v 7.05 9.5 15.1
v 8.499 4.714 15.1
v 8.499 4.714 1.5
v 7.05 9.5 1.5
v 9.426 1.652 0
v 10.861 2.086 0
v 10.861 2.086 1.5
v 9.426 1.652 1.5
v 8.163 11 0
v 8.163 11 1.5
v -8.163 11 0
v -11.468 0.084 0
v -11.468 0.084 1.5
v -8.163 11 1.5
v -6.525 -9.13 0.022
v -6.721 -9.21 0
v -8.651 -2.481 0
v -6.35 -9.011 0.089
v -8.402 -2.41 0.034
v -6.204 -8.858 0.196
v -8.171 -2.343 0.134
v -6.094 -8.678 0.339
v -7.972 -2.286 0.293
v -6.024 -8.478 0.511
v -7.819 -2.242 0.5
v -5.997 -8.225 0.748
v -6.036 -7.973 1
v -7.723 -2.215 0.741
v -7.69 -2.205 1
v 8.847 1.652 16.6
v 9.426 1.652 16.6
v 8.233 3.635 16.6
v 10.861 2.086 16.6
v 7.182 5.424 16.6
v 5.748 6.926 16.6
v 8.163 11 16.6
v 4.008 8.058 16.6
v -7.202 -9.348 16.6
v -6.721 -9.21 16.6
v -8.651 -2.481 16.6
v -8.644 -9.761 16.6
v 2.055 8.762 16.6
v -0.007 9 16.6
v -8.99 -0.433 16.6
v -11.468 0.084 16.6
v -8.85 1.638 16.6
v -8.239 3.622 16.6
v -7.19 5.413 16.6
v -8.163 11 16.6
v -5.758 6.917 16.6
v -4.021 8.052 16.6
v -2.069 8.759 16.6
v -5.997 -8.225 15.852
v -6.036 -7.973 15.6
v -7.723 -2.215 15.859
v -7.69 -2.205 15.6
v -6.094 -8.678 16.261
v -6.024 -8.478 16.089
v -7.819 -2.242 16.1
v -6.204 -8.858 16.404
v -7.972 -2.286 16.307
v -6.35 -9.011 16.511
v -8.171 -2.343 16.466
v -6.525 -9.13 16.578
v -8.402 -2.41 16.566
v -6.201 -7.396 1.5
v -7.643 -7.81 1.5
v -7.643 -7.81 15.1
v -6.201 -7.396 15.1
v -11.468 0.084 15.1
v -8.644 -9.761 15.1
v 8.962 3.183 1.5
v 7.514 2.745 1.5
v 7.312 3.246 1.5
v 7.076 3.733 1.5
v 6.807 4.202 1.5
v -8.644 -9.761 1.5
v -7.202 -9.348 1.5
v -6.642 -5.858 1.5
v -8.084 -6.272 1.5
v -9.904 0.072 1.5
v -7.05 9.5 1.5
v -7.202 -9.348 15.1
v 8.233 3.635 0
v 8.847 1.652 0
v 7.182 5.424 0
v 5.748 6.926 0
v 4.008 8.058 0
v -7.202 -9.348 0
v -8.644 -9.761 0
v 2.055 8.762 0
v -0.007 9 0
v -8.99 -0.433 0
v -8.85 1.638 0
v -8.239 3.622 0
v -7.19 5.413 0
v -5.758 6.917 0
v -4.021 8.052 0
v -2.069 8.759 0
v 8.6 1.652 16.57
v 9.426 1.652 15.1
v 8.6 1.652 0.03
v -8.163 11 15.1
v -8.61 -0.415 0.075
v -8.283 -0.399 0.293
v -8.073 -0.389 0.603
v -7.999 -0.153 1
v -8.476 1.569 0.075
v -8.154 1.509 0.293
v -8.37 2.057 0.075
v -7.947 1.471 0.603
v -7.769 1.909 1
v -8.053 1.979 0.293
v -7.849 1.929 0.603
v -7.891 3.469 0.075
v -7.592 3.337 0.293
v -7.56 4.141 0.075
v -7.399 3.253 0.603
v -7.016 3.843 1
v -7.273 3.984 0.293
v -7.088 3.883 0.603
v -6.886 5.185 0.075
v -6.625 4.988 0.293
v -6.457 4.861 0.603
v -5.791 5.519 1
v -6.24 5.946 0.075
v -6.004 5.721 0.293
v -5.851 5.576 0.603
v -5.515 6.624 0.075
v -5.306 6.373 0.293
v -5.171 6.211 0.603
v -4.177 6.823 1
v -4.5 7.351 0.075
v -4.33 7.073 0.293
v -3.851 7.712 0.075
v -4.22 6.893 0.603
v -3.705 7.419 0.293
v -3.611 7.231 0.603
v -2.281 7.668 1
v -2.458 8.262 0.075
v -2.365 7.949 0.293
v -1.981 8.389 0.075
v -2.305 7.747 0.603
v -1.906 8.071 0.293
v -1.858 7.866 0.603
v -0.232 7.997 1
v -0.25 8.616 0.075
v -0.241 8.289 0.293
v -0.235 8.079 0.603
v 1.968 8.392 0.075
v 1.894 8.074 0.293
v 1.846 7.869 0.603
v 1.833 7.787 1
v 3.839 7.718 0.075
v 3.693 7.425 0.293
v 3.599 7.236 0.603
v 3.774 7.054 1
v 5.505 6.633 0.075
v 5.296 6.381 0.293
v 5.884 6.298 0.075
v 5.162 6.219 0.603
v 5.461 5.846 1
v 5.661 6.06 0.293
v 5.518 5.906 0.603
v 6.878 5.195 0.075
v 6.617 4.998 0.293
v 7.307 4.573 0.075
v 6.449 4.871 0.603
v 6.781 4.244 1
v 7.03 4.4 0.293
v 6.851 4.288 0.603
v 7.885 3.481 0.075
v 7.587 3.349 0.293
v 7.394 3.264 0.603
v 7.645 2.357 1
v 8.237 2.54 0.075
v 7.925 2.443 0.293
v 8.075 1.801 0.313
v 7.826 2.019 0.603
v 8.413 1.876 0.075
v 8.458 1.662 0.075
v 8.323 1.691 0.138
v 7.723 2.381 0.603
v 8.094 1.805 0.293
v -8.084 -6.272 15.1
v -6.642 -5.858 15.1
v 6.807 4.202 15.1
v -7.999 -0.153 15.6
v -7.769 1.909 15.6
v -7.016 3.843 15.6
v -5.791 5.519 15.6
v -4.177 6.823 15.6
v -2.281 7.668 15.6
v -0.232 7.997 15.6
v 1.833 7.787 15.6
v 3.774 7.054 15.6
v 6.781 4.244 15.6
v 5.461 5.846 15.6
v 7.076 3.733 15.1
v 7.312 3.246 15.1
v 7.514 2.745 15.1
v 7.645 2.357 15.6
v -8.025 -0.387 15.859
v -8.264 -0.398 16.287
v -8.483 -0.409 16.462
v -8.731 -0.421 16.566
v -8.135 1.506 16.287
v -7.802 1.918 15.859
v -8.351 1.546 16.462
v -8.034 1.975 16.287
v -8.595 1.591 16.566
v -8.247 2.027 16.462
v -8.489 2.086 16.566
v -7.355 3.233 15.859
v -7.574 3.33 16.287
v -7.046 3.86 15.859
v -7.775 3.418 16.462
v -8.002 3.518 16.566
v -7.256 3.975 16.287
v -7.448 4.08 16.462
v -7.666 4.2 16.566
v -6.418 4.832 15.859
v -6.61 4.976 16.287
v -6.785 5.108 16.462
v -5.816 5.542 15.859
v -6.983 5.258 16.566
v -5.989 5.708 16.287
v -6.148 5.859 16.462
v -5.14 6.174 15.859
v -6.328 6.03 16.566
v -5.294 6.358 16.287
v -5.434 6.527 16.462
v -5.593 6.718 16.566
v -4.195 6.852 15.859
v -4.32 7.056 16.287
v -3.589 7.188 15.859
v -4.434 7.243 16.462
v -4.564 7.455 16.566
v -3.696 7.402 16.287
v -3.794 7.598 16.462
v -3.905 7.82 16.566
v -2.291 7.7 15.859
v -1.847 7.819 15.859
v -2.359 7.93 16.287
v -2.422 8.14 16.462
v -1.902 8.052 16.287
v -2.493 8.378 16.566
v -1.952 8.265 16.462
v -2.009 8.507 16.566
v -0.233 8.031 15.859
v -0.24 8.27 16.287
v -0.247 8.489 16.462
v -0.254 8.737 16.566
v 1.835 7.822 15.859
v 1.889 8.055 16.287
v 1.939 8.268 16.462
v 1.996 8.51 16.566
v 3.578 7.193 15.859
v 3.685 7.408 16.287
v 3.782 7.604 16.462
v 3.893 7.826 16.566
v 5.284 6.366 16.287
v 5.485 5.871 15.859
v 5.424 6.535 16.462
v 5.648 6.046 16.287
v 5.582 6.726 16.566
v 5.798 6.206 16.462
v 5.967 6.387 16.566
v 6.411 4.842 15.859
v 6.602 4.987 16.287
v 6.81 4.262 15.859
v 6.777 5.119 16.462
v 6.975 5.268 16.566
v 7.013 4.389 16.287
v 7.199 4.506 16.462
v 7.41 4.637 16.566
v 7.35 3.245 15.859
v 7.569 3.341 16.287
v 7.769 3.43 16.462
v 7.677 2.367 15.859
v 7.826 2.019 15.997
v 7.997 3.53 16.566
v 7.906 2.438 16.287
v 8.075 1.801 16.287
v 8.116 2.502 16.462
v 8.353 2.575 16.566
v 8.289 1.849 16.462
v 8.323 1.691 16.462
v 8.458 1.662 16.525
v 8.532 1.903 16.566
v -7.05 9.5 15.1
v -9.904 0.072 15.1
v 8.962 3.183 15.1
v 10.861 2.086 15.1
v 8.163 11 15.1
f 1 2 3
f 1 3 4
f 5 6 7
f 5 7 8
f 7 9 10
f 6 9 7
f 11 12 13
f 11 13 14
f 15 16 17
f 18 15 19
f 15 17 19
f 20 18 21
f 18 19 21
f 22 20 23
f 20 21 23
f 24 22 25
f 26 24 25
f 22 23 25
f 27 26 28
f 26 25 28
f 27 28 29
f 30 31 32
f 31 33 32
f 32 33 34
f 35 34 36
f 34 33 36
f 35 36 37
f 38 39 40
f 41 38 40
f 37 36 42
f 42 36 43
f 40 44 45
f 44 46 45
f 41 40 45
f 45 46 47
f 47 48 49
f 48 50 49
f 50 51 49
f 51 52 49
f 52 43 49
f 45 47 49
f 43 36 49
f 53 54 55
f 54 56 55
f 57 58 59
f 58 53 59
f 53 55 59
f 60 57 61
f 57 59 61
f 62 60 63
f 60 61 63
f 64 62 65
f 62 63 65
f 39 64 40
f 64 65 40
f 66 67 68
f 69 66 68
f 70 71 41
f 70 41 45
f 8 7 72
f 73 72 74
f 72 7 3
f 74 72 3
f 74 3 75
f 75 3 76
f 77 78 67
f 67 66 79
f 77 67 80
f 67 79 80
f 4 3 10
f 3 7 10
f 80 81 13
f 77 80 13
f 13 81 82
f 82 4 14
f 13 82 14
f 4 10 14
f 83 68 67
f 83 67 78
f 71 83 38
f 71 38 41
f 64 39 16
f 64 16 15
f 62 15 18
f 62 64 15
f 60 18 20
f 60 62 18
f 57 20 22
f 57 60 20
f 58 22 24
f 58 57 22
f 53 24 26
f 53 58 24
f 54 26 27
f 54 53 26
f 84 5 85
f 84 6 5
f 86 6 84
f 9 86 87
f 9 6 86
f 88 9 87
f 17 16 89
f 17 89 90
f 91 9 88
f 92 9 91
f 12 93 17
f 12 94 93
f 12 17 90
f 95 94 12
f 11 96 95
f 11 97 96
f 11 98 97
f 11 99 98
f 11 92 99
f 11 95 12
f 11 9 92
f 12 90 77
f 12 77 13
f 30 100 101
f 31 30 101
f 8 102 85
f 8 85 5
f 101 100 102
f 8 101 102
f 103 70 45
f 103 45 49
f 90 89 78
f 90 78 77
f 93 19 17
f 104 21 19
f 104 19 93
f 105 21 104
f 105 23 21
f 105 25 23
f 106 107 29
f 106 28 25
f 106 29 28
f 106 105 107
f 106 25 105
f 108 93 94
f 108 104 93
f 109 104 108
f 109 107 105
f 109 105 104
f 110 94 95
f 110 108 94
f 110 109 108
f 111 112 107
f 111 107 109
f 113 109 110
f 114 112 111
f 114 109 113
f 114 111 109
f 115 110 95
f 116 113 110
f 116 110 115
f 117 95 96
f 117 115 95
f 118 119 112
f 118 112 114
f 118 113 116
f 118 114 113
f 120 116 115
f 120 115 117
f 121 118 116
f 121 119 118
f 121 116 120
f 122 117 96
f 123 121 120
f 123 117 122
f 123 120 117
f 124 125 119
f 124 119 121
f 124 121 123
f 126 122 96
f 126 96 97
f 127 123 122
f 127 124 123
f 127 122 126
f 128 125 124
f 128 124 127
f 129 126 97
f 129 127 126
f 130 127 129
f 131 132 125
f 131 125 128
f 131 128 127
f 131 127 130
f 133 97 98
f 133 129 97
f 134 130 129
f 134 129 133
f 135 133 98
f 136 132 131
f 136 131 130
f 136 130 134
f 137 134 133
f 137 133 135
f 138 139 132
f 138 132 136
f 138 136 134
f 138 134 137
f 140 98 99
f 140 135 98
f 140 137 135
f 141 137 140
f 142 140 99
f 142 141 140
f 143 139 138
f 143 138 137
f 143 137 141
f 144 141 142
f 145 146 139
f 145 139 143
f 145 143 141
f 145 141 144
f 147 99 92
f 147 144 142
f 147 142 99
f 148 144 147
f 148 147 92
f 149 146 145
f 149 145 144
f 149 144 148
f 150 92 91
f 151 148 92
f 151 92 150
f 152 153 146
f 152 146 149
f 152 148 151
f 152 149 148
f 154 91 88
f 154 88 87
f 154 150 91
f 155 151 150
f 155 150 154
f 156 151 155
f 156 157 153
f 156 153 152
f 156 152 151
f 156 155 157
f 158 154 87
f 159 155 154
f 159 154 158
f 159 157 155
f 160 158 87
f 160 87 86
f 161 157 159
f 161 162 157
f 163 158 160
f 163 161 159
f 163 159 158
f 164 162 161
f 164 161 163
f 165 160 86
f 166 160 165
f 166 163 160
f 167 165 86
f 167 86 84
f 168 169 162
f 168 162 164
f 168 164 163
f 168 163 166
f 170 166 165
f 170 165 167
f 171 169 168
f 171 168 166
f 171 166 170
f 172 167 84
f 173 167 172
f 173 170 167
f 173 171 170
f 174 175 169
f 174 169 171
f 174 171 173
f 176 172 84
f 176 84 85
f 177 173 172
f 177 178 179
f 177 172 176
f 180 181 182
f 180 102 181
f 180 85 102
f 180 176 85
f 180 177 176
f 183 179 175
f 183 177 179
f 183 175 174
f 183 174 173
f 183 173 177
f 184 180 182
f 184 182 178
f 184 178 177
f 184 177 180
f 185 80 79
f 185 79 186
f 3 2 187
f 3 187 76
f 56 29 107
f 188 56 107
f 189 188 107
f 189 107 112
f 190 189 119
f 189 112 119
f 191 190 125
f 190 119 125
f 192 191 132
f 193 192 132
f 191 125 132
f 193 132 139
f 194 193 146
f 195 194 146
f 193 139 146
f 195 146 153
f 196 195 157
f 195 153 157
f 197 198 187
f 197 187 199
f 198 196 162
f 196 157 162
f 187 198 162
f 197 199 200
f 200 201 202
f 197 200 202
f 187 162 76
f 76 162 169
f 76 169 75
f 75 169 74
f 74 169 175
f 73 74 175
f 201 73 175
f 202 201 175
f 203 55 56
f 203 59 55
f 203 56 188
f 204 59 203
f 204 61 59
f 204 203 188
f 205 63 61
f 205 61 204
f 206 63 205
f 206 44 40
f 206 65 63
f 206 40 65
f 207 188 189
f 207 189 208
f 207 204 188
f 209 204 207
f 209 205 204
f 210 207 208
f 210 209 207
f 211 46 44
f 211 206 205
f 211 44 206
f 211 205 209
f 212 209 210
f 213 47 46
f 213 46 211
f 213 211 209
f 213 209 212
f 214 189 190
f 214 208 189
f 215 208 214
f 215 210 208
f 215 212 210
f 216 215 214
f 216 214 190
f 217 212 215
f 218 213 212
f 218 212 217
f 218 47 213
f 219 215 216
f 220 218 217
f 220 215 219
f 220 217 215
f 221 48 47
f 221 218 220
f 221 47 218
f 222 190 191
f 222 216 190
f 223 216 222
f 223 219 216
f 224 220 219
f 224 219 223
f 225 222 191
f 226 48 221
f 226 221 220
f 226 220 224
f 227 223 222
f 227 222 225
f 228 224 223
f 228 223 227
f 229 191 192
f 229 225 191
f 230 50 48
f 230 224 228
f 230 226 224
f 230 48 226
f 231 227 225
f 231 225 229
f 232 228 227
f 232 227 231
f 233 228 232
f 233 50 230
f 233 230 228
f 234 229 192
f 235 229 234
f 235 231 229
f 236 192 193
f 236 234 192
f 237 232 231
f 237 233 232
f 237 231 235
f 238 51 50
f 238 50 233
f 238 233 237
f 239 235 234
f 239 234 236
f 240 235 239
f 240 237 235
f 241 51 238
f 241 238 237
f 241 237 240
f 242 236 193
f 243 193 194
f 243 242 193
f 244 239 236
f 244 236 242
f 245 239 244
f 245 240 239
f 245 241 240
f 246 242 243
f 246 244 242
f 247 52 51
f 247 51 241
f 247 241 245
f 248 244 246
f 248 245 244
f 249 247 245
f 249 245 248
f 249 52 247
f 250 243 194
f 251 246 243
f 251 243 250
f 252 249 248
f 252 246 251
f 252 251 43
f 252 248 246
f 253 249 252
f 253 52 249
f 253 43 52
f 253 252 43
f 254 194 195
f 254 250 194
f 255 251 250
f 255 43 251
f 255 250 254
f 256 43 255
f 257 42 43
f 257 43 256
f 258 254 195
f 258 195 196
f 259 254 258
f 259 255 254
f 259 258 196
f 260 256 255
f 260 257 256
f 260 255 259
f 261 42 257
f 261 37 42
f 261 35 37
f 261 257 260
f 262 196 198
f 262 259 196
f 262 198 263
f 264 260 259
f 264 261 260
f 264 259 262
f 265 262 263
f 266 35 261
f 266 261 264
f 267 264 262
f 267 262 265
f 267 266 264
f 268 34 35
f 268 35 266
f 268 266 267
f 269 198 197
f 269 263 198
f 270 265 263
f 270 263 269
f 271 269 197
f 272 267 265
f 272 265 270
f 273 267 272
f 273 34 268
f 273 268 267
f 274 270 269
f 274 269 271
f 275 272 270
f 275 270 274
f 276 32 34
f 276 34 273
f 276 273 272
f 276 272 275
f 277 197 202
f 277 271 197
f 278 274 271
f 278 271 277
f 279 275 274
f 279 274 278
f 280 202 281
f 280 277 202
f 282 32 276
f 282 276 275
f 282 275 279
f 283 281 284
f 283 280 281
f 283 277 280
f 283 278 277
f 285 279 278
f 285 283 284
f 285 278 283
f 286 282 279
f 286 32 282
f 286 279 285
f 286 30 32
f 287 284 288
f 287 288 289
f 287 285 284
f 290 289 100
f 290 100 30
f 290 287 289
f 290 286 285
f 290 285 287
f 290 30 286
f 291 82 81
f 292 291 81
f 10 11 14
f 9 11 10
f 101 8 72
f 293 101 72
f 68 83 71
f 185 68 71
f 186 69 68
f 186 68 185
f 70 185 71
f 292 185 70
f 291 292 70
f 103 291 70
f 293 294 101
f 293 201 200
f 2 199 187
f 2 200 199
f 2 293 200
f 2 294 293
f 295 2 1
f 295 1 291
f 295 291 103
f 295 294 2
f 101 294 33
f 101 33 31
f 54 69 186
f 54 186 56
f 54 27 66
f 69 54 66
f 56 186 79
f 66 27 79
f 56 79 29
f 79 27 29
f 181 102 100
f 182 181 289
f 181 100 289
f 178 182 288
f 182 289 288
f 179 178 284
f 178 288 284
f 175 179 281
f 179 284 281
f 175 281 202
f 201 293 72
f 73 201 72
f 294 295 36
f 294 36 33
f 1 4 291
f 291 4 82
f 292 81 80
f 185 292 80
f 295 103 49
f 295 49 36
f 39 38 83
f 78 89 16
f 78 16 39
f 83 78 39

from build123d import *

# Parameters (mm, degrees)
BOSS_EXTRUDE1_DEPTH     = 16.6
BOSS_EXTRUDE2_DEPTH     = 16.6
CUT_EXTRUDE1_START      = 1.5
CUT_EXTRUDE1_DEPTH      = 13.6
CUT_EXTRUDE2_REACH      = 31.238
CUT_EXTRUDE2_END_RADIUS = 8
SKETCH3_W               = 13.6
SKETCH3_H               = 1.6
SKETCH4_W               = 13.6
SKETCH4_H               = 1.6
CUT_EXTRUDE3_DEPTH      = 1.5
FILLET1_R               = 1


with BuildPart() as part:
    # Sketch1 → Boss-Extrude1 (new body)
    with BuildSketch(Plane.XY):
        with BuildLine():
            Line((7.05, 9.5), (-7.05, 9.5))
            Line((-7.05, 9.5), (-9.903774495, 0.072462085))
            Line((-9.903774495, 0.072462085), (-7.202037804, -9.347761843))
            Line((-7.202037804, -9.347761843), (-5.760166795, -8.934230717))
            Line((-5.760166795, -8.934230717), (-7.689978717, -2.205499339))
            ThreePointArc((-7.689978717, -2.205499339), (-1.929824659, 7.763747599), (7.82763731, 1.651694325))
            Line((7.82763731, 1.651694325), (9.425731052, 1.651694325))
            Line((9.425731052, 1.651694325), (7.05, 9.5))
        make_face()
    extrude(amount=BOSS_EXTRUDE1_DEPTH)

    # Sketch2 → Boss-Extrude2 (add)
    with BuildSketch(Plane.XY):
        Polygon((-9.903774495, 0.072462085), (-7.202037804, -9.347761843), (-8.643908814, -9.761292969), (-11.467528363, 0.083903467), (-8.163157895, 11), (8.163157895, 11), (10.861396724, 2.086279273), (9.425731052, 1.651694325), (7.05, 9.5), (-7.05, 9.5), align=None)
    extrude(amount=BOSS_EXTRUDE2_DEPTH)

    # Sketch2<4> → Cut-Extrude1 (cut)
    with BuildSketch(Plane.XY.offset(CUT_EXTRUDE1_START)):
        Polygon((-9.903774495, 0.072462085), (-7.202037804, -9.347761843), (-8.643908814, -9.761292969), (-11.467528363, 0.083903467), (-8.163157895, 11), (8.163157895, 11), (10.861396724, 2.086279273), (9.425731052, 1.651694325), (7.05, 9.5), (-7.05, 9.5), align=None)
    extrude(amount=CUT_EXTRUDE1_DEPTH, mode=Mode.SUBTRACT)

    # Cut-Extrude2: up to this cylinder (the profile starts outside it)
    cut_extrude2_end = Plane(origin=(0, 0, 8.3), z_dir=(0, 0, -1)) * Cylinder(CUT_EXTRUDE2_END_RADIUS, 79.476, mode=Mode.PRIVATE)
    # Sketch3 → Cut-Extrude2 (cut, up to the surface)
    with BuildSketch(Plane(origin=(9.092549258, 2.75237134, 0), x_dir=(0, 0, -1), z_dir=(0.9571104481877781, 0.2897232989764385, 0)), mode=Mode.PRIVATE) as cut_extrude2_sk1:
        with Locations((-8.3, 1.25)):
            Rectangle(SKETCH3_W, SKETCH3_H)
    cut_extrude2_tool1 = extrude(cut_extrude2_sk1.sketch, amount=-CUT_EXTRUDE2_REACH, mode=Mode.PRIVATE) - cut_extrude2_end
    add(cut_extrude2_tool1.solids().sort_by_distance((8.730395, 3.948759, 8.3))[0], mode=Mode.SUBTRACT)

    # Sketch4 → Cut-Extrude3 (cut)
    with BuildSketch(Plane(origin=(-9.131849726, -2.619030466, 0), x_dir=(0, 0, 1), z_dir=(-0.9612473395932443, -0.2756874174221783, 0))):
        with Locations((8.3, -4.6)):
            Rectangle(SKETCH4_W, SKETCH4_H)
    extrude(amount=-CUT_EXTRUDE3_DEPTH, mode=Mode.SUBTRACT)

    # Fillet1
    fillet1_edges = [part.edges().sort_by_distance(p)[0] for p in [
        (7.82763731, 1.651694325, 8.3),
        (-5.760166795, -8.934230717, 8.3),
        (-6.725072756, -5.569865028, 16.6),
        (-1.929824659, 7.763747599, 16.6),
        (-1.929824659, 7.763747599, 0),
        (-6.725072756, -5.569865028, 0),
    ]]
    fillet(fillet1_edges, radius=FILLET1_R)


solid = part.part
